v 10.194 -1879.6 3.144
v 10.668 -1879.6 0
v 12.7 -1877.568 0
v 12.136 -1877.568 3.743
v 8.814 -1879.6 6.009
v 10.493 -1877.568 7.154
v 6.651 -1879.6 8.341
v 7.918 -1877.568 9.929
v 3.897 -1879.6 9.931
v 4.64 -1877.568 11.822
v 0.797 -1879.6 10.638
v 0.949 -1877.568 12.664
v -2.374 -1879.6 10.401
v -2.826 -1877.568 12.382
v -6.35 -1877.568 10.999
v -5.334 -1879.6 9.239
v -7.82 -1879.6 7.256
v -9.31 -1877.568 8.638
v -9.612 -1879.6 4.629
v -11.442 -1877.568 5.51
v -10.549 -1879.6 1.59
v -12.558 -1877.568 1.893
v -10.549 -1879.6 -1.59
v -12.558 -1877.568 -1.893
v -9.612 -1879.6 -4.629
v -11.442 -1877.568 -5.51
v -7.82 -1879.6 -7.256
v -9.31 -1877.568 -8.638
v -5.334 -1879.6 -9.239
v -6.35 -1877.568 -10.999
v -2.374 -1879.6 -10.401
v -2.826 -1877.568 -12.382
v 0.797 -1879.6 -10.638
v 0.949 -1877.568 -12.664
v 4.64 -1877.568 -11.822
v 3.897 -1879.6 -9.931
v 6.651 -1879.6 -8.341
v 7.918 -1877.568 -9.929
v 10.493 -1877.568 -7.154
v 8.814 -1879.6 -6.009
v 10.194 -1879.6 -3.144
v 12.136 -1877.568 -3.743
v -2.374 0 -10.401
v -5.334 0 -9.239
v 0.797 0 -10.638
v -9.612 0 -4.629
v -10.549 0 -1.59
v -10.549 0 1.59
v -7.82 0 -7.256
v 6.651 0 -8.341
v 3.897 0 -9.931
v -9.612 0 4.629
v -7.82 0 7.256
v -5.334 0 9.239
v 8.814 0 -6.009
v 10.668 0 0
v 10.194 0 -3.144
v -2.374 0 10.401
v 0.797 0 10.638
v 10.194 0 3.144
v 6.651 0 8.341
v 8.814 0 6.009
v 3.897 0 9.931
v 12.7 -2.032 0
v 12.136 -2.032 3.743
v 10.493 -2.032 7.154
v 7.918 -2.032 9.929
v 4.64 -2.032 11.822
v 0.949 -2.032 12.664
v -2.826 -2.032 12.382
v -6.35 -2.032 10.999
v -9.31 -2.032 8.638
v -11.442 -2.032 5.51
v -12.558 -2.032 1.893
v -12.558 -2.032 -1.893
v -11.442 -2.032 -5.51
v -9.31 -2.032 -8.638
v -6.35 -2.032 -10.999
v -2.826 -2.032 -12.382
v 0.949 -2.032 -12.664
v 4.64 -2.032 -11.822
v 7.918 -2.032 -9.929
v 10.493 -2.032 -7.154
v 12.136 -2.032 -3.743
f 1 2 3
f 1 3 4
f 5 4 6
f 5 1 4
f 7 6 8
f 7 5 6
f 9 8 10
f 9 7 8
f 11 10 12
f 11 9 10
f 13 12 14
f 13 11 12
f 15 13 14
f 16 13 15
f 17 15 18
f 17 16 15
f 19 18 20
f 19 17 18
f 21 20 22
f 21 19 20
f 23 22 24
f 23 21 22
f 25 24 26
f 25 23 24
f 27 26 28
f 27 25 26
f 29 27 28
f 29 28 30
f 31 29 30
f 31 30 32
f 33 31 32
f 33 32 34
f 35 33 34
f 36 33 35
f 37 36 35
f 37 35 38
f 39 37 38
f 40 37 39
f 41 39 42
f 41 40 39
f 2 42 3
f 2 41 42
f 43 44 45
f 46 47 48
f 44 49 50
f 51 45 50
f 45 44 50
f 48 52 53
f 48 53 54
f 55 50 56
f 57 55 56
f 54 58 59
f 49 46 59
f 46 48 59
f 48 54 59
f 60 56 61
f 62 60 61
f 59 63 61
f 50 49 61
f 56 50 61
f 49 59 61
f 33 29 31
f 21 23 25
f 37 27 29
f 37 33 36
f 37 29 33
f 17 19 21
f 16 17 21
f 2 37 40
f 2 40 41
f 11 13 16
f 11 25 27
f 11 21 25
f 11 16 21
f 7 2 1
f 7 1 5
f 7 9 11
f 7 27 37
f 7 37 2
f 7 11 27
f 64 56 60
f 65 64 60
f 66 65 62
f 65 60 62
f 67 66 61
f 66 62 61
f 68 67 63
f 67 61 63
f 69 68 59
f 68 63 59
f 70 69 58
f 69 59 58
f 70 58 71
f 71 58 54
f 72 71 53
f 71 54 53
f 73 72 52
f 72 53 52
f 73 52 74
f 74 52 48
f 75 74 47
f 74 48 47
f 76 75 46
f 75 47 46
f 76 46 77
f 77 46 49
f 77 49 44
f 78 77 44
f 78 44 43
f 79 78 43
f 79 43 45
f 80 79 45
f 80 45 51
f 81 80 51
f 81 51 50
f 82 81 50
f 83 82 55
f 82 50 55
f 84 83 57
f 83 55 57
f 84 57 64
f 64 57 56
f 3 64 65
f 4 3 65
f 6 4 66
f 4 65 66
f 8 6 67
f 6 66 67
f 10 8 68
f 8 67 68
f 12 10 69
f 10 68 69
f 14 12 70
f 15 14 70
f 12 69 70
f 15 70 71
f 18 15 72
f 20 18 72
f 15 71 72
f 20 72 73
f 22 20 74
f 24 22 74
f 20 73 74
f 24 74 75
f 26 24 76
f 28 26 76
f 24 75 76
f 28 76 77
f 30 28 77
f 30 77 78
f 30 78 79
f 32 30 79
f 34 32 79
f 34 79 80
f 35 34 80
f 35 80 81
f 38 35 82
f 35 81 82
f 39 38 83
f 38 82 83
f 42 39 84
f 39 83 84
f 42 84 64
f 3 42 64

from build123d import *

# Parameters (mm, degrees)
F0_R     = 12.7
F1_DEPTH = 1879.6
F2_SIZE2 = 2.032
F2_SIZE  = 2.032
F3_SIZE2 = 2.032
F3_SIZE  = 2.032


with BuildPart() as f1:
    # F0 (on Front) → F1 (new body)
    with BuildSketch(Plane.XZ):
        Circle(F0_R)
    extrude(amount=F1_DEPTH)

    # F2
    f2_edges = [f1.edges().sort_by_distance(p)[0] for p in [
        (-12.7, -1879.6, 0),
    ]]
    chamfer(f2_edges, length=F2_SIZE, length2=F2_SIZE2)

    # F3
    f3_edges = [f1.edges().sort_by_distance(p)[0] for p in [
        (-12.7, 0, 0),
    ]]
    chamfer(f3_edges, length=F3_SIZE, length2=F3_SIZE2)


solid = f1.part
